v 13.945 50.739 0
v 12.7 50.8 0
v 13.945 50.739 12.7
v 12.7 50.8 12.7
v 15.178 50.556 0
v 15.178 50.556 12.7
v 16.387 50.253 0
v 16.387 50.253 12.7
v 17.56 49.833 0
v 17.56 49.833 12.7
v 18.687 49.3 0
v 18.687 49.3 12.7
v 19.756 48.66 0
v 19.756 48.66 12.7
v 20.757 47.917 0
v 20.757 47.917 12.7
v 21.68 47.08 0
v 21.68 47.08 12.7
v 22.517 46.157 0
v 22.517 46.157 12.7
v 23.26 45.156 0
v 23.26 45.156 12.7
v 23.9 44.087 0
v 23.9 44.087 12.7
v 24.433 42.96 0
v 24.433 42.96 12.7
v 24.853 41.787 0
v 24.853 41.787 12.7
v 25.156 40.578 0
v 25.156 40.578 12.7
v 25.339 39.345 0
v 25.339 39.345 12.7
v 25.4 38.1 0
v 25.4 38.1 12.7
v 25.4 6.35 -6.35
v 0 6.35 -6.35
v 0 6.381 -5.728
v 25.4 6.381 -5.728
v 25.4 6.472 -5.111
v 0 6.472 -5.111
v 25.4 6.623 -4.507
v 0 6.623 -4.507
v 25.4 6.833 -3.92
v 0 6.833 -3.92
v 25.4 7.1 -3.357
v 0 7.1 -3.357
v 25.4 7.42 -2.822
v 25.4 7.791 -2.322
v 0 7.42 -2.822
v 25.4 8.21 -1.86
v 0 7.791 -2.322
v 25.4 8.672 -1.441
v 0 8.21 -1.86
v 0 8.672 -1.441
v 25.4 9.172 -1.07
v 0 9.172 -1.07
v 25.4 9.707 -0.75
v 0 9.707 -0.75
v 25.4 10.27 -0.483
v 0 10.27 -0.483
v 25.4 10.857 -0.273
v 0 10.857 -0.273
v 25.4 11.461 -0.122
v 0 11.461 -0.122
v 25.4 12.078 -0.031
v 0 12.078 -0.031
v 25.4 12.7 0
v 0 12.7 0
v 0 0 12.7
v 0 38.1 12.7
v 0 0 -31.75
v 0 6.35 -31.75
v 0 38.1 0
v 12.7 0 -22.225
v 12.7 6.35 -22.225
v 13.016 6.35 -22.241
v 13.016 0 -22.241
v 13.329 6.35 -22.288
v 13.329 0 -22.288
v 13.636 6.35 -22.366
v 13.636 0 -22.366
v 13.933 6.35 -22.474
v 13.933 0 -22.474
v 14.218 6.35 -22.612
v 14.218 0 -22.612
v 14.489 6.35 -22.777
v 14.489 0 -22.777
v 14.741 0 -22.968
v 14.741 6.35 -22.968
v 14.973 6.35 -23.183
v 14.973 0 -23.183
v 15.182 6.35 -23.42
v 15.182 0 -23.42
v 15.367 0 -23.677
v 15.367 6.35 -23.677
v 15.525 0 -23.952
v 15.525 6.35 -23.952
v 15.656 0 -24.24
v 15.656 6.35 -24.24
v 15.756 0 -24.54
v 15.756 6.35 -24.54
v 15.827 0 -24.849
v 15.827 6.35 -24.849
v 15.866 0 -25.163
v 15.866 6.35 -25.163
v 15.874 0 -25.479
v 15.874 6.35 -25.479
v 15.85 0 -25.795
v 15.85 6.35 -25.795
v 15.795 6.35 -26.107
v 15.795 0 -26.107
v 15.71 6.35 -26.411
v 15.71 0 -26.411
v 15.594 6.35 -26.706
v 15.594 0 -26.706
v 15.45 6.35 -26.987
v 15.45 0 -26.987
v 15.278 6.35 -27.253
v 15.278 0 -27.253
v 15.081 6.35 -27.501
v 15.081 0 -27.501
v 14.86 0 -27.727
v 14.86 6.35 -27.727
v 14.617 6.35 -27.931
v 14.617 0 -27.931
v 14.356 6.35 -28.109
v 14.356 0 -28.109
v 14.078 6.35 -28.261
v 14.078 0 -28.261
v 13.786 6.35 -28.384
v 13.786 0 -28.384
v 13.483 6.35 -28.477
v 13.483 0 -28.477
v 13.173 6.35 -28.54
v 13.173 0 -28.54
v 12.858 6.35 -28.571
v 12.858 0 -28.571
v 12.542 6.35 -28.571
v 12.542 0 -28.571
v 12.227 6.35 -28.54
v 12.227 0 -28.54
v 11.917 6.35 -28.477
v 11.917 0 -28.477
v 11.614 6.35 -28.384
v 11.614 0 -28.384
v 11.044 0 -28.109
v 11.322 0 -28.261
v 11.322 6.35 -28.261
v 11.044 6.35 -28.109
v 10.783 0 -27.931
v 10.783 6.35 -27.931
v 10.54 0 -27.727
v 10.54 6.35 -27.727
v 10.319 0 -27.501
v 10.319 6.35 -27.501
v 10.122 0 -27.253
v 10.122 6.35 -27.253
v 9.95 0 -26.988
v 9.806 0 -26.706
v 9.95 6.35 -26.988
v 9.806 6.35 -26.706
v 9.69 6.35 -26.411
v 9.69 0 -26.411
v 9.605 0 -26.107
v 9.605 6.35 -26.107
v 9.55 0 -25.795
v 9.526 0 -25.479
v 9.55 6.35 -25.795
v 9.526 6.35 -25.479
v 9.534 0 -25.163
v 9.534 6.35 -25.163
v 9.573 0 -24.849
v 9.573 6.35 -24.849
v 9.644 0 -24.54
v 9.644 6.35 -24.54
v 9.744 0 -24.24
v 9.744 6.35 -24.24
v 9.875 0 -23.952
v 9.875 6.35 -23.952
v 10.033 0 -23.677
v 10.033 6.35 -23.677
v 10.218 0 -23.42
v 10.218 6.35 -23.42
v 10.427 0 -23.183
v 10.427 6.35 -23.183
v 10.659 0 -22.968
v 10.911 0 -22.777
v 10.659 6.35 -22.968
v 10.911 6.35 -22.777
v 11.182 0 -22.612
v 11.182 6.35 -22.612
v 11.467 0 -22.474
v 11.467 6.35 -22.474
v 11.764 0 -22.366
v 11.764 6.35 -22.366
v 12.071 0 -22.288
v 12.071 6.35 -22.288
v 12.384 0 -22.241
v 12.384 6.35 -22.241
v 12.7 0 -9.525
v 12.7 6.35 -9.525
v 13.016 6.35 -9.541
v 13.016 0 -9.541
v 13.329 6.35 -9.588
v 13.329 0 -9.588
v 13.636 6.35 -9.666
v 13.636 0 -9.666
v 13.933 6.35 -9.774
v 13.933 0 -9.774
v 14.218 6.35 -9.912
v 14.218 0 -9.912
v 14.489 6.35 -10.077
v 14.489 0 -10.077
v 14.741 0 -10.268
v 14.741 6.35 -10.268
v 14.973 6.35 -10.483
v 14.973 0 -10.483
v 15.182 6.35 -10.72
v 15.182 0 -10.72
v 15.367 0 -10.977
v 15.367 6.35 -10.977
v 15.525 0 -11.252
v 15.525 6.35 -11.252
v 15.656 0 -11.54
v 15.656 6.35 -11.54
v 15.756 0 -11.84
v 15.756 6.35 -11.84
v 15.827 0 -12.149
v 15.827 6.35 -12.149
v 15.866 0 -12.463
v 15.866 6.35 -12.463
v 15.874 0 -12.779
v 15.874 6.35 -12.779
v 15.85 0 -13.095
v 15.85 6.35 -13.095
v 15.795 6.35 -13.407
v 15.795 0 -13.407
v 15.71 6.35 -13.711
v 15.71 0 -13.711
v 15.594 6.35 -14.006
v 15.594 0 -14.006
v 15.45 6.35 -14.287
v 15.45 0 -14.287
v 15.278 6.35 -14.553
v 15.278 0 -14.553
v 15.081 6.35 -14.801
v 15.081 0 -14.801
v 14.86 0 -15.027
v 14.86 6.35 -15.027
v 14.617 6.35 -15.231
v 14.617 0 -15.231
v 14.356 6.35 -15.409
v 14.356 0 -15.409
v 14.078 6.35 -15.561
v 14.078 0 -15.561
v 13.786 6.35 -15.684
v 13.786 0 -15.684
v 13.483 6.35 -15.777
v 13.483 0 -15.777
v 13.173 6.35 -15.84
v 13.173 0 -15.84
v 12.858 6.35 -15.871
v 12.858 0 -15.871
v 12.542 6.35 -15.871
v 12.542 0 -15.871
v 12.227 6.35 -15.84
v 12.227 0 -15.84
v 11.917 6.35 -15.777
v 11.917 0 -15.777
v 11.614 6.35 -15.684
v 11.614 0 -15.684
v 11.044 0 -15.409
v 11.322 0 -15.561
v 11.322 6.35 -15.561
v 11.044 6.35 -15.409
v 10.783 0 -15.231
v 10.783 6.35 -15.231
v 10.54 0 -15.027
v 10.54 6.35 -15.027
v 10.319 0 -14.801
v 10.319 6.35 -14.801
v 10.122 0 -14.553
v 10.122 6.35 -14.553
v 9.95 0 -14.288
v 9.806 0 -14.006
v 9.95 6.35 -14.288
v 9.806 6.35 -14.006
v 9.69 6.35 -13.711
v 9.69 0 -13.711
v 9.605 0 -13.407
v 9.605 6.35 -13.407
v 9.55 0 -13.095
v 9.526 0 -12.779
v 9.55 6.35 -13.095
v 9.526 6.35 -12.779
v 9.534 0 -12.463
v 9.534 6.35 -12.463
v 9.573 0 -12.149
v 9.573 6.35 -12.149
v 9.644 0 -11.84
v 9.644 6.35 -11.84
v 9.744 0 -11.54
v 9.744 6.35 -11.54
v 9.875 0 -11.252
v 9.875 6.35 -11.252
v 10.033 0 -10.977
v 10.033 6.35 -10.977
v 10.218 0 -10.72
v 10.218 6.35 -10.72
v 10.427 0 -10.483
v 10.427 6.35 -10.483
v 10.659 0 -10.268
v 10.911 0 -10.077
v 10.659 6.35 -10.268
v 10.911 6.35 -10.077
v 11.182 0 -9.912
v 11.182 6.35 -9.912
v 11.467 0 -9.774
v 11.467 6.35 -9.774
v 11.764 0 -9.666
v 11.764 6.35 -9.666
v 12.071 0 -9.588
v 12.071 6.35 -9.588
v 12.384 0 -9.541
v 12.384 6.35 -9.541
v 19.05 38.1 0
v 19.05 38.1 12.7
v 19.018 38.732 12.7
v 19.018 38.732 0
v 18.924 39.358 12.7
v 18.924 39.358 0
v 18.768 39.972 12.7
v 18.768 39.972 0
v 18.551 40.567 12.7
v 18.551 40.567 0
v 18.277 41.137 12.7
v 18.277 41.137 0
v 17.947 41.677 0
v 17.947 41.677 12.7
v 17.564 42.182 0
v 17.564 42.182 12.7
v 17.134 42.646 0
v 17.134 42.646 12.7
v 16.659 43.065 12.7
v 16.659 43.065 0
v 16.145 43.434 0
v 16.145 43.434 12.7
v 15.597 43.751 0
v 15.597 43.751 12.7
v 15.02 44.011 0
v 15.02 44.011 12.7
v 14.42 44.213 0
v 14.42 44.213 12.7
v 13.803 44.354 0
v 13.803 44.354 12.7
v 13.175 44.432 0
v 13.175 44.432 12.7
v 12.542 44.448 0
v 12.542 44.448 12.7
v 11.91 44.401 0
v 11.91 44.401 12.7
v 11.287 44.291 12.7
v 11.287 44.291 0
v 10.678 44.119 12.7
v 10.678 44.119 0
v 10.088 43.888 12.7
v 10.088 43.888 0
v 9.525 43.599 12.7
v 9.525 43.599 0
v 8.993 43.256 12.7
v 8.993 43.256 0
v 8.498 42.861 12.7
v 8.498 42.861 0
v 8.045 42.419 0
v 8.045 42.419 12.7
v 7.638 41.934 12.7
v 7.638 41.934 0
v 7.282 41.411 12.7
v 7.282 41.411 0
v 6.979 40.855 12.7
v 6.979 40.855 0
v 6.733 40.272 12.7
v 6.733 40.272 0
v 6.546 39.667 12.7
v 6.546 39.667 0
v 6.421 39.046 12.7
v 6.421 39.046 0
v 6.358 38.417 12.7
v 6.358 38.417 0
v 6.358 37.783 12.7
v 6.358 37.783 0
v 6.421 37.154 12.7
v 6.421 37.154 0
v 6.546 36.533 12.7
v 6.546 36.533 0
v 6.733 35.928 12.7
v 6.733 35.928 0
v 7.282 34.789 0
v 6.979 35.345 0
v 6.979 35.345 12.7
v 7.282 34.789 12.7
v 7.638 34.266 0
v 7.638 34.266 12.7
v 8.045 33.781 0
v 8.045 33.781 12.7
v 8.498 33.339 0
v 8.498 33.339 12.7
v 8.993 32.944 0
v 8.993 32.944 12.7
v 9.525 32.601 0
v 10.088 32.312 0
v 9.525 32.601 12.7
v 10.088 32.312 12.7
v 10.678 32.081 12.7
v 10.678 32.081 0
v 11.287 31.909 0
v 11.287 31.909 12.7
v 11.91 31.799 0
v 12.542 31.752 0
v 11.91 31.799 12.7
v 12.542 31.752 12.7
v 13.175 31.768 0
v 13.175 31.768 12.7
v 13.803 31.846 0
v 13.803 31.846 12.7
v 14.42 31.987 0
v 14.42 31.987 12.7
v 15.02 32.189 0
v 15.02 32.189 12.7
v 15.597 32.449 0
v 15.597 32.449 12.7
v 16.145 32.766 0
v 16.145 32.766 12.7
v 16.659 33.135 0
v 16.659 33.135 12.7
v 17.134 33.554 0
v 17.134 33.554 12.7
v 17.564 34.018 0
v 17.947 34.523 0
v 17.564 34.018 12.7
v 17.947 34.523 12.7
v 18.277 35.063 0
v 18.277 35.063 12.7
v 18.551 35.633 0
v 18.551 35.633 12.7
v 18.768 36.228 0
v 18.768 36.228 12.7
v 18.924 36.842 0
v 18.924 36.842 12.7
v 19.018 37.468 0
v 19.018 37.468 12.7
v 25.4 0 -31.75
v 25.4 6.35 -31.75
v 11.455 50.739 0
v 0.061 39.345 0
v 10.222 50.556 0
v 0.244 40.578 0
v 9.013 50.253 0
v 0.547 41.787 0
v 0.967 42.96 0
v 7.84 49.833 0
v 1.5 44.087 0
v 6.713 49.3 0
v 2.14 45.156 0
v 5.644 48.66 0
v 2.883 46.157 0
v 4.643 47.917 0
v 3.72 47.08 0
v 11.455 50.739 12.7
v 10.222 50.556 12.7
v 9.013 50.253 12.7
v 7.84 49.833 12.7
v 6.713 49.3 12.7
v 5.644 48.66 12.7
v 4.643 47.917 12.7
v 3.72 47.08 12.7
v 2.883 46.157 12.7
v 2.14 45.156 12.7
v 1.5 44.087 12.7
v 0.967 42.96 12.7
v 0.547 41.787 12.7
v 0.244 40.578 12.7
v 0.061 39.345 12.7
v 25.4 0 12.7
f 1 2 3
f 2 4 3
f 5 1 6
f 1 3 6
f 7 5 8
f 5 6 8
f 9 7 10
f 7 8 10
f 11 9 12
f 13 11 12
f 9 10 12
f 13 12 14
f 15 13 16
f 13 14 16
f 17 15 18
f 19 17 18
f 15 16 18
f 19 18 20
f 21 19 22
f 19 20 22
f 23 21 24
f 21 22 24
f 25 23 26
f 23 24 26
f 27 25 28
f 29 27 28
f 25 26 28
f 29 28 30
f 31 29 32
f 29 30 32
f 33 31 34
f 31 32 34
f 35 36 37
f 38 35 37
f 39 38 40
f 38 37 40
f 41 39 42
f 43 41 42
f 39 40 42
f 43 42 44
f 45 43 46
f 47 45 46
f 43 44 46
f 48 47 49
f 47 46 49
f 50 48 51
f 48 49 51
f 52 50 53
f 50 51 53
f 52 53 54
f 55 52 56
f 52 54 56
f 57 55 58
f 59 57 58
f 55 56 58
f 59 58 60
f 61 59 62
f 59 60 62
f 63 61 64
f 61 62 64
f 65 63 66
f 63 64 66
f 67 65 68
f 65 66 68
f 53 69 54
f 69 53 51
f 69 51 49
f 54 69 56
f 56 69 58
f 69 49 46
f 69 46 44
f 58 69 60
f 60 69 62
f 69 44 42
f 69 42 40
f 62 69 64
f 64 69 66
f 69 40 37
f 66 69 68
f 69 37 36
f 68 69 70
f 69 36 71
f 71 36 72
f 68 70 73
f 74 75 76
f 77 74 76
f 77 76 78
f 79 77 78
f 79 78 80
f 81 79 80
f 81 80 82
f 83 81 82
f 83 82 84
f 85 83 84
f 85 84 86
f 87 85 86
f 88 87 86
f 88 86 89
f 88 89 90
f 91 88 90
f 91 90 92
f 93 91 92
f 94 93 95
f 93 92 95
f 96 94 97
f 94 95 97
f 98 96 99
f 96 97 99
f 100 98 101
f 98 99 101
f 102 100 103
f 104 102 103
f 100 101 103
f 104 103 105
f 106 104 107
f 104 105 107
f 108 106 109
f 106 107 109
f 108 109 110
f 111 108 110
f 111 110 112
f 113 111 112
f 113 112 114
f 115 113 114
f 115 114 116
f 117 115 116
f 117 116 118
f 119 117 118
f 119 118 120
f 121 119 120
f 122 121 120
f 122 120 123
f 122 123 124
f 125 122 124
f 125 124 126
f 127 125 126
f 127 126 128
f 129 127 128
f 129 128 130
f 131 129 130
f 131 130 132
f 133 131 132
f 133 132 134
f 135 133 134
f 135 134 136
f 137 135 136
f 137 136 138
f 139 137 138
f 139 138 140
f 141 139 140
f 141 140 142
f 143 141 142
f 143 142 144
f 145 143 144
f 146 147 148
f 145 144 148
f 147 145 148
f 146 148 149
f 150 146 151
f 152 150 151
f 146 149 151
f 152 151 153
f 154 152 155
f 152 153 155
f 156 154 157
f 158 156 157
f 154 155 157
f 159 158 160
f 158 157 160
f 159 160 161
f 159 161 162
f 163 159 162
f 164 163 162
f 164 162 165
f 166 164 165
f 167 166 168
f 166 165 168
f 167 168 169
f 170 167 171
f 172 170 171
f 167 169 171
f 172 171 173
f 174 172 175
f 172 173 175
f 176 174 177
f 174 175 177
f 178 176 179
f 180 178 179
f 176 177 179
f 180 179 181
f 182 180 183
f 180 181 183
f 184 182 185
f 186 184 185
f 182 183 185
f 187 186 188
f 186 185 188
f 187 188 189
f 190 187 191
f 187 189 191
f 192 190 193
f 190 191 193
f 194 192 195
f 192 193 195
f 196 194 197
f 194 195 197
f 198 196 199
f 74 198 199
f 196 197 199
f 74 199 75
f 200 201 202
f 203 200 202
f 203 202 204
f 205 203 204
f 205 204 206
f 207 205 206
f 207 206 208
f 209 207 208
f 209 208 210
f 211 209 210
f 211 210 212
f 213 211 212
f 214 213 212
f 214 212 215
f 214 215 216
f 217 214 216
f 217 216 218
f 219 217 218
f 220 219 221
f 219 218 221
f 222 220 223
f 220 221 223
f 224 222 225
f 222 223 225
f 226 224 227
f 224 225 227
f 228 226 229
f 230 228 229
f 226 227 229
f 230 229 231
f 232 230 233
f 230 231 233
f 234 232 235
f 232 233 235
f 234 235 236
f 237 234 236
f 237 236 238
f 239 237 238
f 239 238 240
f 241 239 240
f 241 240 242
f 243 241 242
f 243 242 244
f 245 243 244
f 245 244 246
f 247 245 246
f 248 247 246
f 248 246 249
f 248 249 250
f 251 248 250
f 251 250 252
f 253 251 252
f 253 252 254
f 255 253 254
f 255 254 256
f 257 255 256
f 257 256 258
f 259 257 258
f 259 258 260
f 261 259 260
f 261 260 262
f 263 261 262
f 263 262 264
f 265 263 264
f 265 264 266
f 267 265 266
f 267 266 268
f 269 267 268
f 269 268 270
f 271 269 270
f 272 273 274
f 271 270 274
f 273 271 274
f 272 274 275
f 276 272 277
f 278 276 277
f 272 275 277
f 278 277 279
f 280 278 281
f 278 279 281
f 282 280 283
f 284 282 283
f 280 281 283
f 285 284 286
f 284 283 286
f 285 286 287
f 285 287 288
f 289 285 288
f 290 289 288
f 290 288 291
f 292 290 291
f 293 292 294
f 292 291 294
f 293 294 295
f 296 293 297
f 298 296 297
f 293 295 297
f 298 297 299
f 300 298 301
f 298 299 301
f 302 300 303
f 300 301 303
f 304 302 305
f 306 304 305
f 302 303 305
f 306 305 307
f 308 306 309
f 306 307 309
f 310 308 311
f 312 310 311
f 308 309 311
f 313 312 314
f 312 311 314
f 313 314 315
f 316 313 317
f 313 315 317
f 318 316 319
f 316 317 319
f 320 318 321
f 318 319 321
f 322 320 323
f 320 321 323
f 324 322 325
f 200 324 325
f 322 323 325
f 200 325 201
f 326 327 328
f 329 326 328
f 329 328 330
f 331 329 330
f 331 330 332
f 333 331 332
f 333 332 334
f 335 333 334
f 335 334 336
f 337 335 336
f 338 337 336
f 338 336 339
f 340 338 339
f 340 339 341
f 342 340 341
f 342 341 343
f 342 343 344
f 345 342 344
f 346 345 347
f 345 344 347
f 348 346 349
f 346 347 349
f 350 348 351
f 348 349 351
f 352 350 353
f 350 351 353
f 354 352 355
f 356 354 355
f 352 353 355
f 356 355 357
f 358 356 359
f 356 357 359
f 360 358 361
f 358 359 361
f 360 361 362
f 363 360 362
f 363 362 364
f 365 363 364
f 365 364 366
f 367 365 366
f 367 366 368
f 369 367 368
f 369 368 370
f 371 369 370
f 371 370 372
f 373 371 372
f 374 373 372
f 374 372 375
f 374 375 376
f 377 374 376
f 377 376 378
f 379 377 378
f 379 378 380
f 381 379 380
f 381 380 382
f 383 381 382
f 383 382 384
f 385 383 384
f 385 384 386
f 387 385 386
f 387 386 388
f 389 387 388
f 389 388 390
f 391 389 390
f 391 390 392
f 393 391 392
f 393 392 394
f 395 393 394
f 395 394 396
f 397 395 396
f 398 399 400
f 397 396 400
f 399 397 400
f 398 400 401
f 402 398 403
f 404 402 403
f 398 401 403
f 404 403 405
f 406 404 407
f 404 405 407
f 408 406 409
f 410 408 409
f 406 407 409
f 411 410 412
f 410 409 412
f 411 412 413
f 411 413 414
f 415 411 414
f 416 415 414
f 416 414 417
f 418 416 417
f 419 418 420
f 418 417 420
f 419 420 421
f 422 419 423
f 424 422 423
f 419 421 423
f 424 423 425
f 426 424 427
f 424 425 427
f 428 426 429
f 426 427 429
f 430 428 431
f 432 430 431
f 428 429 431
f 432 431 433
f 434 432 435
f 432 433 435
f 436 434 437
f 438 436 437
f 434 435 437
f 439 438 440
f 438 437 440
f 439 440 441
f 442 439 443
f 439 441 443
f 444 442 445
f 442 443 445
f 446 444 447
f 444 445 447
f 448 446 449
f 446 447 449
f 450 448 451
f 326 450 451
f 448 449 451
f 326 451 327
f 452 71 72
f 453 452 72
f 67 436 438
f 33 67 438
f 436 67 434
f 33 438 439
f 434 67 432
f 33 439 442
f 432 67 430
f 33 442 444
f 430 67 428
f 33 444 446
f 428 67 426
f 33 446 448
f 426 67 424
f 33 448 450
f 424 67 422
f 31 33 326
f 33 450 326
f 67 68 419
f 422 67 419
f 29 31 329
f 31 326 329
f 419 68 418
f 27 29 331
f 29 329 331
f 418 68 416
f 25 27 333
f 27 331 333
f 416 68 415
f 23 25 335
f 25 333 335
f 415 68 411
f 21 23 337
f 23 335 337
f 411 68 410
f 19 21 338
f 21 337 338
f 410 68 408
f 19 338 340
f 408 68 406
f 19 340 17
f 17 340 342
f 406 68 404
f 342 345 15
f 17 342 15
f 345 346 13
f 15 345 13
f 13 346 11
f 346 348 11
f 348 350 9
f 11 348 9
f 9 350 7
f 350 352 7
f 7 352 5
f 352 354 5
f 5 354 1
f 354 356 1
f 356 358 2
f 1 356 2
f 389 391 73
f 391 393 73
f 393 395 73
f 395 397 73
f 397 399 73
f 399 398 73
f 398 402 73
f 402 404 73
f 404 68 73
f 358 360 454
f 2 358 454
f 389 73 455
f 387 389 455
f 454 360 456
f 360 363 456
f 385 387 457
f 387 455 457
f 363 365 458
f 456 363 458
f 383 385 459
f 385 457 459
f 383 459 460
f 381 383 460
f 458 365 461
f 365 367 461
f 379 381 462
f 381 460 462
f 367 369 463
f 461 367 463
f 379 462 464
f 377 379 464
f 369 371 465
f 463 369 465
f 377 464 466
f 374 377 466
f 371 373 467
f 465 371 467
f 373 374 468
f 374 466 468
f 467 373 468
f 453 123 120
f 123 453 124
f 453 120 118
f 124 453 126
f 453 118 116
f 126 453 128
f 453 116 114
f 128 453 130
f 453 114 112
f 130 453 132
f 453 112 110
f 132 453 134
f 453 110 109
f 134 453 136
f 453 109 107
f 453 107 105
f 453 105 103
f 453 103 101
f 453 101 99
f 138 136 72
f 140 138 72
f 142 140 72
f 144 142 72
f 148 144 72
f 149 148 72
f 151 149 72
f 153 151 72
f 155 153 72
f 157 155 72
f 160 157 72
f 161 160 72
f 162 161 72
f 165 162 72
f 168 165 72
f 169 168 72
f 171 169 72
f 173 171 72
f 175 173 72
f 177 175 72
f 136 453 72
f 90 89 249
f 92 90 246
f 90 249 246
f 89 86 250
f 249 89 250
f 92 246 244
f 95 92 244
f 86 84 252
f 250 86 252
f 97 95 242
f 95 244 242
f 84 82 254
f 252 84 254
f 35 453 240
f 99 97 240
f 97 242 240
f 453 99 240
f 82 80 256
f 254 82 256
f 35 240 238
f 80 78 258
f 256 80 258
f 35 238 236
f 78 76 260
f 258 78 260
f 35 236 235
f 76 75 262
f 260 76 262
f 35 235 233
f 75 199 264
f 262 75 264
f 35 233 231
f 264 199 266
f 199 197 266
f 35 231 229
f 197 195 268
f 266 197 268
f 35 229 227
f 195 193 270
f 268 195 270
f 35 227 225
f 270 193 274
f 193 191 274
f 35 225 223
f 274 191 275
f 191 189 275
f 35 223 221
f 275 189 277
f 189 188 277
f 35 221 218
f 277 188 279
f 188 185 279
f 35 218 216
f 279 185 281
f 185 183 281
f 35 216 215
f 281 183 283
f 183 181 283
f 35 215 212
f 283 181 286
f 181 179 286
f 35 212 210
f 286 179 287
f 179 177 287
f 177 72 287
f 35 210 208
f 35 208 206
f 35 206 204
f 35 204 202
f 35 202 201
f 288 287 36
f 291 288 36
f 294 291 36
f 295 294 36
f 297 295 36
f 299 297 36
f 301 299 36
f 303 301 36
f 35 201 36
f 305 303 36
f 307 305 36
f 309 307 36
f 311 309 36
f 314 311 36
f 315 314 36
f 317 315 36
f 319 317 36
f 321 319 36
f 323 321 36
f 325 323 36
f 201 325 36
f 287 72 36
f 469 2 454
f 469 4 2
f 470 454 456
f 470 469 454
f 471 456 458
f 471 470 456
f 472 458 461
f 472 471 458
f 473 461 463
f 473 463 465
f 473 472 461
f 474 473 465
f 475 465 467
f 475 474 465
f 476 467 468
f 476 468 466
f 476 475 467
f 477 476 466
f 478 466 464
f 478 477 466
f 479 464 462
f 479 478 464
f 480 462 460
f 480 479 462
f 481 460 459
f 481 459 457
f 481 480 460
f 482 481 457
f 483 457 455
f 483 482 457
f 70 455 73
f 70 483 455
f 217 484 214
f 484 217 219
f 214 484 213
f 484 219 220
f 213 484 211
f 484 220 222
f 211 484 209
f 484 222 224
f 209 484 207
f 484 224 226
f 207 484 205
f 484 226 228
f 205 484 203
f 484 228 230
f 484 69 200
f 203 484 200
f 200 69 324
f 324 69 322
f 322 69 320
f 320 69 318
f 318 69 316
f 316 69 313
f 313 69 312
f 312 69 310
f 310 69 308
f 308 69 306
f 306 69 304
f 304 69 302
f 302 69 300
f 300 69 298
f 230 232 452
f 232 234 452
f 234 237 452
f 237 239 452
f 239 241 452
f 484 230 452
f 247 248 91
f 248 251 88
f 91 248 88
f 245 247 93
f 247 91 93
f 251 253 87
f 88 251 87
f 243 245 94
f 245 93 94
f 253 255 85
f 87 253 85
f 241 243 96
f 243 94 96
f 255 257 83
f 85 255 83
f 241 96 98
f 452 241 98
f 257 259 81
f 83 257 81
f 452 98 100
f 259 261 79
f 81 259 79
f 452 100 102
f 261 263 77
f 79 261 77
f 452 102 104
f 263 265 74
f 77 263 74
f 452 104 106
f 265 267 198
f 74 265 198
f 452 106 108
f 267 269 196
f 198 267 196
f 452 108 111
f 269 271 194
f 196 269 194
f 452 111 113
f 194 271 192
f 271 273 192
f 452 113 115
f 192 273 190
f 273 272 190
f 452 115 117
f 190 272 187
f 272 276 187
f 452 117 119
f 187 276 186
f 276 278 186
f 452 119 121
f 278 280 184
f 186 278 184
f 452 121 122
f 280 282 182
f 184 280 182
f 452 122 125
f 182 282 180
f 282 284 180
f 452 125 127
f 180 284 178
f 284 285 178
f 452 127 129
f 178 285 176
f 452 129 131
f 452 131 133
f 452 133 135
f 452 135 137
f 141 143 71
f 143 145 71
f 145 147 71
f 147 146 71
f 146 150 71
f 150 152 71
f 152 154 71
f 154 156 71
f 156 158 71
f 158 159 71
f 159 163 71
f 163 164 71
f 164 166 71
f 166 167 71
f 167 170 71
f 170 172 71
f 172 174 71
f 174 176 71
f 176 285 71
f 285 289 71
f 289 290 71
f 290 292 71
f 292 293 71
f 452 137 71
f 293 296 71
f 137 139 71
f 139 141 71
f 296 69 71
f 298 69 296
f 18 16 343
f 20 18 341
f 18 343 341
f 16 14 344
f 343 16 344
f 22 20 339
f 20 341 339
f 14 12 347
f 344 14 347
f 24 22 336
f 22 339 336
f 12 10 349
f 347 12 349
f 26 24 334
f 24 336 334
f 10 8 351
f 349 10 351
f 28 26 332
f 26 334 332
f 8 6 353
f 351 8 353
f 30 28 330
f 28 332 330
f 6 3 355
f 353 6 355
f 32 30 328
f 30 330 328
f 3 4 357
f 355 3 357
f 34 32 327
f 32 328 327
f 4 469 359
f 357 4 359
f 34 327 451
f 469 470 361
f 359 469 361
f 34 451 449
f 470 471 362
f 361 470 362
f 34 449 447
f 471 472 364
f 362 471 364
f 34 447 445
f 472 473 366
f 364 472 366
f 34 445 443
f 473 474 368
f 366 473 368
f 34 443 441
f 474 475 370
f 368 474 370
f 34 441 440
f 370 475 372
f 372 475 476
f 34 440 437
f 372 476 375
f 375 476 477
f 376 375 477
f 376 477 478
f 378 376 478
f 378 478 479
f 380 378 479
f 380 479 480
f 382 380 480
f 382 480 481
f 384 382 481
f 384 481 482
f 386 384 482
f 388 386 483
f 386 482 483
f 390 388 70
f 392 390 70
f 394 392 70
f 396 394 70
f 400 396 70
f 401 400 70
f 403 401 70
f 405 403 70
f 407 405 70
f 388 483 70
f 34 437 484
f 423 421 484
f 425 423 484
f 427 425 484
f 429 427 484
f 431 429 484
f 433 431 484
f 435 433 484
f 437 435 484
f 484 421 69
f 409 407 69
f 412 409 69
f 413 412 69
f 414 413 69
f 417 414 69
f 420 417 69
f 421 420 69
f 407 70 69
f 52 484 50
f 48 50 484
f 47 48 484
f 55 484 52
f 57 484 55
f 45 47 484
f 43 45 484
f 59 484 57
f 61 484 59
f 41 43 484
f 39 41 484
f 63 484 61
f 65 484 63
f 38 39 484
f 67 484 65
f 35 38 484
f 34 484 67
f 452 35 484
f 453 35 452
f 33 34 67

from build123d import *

# Parameters (mm, degrees)
BOSS_EXTRUDE1_DEPTH = 25.4
FILLET1_R           = 12.7
SKETCH2_R           = 6.35
CUT_EXTRUDE1_DEPTH  = 25.4
SKETCH3_R           = 3.175
CUT_EXTRUDE2_DEPTH  = 25.4


with BuildPart() as part:
    # Sketch1 → Boss-Extrude1 (new body)
    with BuildSketch(Plane(origin=(0, 0, 0), x_dir=(0, 0, -1), z_dir=(1, 0, 0))):
        with BuildLine():
            Line((-12.7, 0), (0, 0))
            Line((0, 0), (31.75, 0))
            Line((31.75, 0), (31.75, 6.35))
            Line((31.75, 6.35), (6.35, 6.35))
            ThreePointArc((6.35, 6.35), (1.859871939, 8.209871939), (0, 12.7))
            Line((0, 12.7), (0, 50.8))
            Line((0, 50.8), (-12.7, 50.8))
            Line((-12.7, 50.8), (-12.7, 0))
        make_face()
    extrude(amount=BOSS_EXTRUDE1_DEPTH)

    # Fillet1
    fillet1_edges = [part.edges().sort_by_distance(p)[0] for p in [
        (25.4, 50.8, 6.35),
        (0, 50.8, 6.35),
    ]]
    fillet(fillet1_edges, radius=FILLET1_R - 0.0001)  # a hair under: the kernel refuses the full size

    # Sketch2 → Cut-Extrude1 (cut)
    with BuildSketch(Plane.XY.offset(12.7)):
        with Locations((12.7, 38.1)):
            Circle(SKETCH2_R)
    extrude(amount=-CUT_EXTRUDE1_DEPTH, mode=Mode.SUBTRACT)

    # Sketch3 → Cut-Extrude2 (cut)
    with BuildSketch(Plane(origin=(0, 6.35, 0), x_dir=(1, 0, 0), z_dir=(0, 1, 0))):
        with Locations(Location((12.7, 25.4, 0), (0, 0, 270))):
            Circle(SKETCH3_R)
        with Locations(Location((12.7, 12.7, 0), (0, 0, 270))):
            Circle(SKETCH3_R)
    extrude(amount=-CUT_EXTRUDE2_DEPTH, mode=Mode.SUBTRACT)


solid = part.part
